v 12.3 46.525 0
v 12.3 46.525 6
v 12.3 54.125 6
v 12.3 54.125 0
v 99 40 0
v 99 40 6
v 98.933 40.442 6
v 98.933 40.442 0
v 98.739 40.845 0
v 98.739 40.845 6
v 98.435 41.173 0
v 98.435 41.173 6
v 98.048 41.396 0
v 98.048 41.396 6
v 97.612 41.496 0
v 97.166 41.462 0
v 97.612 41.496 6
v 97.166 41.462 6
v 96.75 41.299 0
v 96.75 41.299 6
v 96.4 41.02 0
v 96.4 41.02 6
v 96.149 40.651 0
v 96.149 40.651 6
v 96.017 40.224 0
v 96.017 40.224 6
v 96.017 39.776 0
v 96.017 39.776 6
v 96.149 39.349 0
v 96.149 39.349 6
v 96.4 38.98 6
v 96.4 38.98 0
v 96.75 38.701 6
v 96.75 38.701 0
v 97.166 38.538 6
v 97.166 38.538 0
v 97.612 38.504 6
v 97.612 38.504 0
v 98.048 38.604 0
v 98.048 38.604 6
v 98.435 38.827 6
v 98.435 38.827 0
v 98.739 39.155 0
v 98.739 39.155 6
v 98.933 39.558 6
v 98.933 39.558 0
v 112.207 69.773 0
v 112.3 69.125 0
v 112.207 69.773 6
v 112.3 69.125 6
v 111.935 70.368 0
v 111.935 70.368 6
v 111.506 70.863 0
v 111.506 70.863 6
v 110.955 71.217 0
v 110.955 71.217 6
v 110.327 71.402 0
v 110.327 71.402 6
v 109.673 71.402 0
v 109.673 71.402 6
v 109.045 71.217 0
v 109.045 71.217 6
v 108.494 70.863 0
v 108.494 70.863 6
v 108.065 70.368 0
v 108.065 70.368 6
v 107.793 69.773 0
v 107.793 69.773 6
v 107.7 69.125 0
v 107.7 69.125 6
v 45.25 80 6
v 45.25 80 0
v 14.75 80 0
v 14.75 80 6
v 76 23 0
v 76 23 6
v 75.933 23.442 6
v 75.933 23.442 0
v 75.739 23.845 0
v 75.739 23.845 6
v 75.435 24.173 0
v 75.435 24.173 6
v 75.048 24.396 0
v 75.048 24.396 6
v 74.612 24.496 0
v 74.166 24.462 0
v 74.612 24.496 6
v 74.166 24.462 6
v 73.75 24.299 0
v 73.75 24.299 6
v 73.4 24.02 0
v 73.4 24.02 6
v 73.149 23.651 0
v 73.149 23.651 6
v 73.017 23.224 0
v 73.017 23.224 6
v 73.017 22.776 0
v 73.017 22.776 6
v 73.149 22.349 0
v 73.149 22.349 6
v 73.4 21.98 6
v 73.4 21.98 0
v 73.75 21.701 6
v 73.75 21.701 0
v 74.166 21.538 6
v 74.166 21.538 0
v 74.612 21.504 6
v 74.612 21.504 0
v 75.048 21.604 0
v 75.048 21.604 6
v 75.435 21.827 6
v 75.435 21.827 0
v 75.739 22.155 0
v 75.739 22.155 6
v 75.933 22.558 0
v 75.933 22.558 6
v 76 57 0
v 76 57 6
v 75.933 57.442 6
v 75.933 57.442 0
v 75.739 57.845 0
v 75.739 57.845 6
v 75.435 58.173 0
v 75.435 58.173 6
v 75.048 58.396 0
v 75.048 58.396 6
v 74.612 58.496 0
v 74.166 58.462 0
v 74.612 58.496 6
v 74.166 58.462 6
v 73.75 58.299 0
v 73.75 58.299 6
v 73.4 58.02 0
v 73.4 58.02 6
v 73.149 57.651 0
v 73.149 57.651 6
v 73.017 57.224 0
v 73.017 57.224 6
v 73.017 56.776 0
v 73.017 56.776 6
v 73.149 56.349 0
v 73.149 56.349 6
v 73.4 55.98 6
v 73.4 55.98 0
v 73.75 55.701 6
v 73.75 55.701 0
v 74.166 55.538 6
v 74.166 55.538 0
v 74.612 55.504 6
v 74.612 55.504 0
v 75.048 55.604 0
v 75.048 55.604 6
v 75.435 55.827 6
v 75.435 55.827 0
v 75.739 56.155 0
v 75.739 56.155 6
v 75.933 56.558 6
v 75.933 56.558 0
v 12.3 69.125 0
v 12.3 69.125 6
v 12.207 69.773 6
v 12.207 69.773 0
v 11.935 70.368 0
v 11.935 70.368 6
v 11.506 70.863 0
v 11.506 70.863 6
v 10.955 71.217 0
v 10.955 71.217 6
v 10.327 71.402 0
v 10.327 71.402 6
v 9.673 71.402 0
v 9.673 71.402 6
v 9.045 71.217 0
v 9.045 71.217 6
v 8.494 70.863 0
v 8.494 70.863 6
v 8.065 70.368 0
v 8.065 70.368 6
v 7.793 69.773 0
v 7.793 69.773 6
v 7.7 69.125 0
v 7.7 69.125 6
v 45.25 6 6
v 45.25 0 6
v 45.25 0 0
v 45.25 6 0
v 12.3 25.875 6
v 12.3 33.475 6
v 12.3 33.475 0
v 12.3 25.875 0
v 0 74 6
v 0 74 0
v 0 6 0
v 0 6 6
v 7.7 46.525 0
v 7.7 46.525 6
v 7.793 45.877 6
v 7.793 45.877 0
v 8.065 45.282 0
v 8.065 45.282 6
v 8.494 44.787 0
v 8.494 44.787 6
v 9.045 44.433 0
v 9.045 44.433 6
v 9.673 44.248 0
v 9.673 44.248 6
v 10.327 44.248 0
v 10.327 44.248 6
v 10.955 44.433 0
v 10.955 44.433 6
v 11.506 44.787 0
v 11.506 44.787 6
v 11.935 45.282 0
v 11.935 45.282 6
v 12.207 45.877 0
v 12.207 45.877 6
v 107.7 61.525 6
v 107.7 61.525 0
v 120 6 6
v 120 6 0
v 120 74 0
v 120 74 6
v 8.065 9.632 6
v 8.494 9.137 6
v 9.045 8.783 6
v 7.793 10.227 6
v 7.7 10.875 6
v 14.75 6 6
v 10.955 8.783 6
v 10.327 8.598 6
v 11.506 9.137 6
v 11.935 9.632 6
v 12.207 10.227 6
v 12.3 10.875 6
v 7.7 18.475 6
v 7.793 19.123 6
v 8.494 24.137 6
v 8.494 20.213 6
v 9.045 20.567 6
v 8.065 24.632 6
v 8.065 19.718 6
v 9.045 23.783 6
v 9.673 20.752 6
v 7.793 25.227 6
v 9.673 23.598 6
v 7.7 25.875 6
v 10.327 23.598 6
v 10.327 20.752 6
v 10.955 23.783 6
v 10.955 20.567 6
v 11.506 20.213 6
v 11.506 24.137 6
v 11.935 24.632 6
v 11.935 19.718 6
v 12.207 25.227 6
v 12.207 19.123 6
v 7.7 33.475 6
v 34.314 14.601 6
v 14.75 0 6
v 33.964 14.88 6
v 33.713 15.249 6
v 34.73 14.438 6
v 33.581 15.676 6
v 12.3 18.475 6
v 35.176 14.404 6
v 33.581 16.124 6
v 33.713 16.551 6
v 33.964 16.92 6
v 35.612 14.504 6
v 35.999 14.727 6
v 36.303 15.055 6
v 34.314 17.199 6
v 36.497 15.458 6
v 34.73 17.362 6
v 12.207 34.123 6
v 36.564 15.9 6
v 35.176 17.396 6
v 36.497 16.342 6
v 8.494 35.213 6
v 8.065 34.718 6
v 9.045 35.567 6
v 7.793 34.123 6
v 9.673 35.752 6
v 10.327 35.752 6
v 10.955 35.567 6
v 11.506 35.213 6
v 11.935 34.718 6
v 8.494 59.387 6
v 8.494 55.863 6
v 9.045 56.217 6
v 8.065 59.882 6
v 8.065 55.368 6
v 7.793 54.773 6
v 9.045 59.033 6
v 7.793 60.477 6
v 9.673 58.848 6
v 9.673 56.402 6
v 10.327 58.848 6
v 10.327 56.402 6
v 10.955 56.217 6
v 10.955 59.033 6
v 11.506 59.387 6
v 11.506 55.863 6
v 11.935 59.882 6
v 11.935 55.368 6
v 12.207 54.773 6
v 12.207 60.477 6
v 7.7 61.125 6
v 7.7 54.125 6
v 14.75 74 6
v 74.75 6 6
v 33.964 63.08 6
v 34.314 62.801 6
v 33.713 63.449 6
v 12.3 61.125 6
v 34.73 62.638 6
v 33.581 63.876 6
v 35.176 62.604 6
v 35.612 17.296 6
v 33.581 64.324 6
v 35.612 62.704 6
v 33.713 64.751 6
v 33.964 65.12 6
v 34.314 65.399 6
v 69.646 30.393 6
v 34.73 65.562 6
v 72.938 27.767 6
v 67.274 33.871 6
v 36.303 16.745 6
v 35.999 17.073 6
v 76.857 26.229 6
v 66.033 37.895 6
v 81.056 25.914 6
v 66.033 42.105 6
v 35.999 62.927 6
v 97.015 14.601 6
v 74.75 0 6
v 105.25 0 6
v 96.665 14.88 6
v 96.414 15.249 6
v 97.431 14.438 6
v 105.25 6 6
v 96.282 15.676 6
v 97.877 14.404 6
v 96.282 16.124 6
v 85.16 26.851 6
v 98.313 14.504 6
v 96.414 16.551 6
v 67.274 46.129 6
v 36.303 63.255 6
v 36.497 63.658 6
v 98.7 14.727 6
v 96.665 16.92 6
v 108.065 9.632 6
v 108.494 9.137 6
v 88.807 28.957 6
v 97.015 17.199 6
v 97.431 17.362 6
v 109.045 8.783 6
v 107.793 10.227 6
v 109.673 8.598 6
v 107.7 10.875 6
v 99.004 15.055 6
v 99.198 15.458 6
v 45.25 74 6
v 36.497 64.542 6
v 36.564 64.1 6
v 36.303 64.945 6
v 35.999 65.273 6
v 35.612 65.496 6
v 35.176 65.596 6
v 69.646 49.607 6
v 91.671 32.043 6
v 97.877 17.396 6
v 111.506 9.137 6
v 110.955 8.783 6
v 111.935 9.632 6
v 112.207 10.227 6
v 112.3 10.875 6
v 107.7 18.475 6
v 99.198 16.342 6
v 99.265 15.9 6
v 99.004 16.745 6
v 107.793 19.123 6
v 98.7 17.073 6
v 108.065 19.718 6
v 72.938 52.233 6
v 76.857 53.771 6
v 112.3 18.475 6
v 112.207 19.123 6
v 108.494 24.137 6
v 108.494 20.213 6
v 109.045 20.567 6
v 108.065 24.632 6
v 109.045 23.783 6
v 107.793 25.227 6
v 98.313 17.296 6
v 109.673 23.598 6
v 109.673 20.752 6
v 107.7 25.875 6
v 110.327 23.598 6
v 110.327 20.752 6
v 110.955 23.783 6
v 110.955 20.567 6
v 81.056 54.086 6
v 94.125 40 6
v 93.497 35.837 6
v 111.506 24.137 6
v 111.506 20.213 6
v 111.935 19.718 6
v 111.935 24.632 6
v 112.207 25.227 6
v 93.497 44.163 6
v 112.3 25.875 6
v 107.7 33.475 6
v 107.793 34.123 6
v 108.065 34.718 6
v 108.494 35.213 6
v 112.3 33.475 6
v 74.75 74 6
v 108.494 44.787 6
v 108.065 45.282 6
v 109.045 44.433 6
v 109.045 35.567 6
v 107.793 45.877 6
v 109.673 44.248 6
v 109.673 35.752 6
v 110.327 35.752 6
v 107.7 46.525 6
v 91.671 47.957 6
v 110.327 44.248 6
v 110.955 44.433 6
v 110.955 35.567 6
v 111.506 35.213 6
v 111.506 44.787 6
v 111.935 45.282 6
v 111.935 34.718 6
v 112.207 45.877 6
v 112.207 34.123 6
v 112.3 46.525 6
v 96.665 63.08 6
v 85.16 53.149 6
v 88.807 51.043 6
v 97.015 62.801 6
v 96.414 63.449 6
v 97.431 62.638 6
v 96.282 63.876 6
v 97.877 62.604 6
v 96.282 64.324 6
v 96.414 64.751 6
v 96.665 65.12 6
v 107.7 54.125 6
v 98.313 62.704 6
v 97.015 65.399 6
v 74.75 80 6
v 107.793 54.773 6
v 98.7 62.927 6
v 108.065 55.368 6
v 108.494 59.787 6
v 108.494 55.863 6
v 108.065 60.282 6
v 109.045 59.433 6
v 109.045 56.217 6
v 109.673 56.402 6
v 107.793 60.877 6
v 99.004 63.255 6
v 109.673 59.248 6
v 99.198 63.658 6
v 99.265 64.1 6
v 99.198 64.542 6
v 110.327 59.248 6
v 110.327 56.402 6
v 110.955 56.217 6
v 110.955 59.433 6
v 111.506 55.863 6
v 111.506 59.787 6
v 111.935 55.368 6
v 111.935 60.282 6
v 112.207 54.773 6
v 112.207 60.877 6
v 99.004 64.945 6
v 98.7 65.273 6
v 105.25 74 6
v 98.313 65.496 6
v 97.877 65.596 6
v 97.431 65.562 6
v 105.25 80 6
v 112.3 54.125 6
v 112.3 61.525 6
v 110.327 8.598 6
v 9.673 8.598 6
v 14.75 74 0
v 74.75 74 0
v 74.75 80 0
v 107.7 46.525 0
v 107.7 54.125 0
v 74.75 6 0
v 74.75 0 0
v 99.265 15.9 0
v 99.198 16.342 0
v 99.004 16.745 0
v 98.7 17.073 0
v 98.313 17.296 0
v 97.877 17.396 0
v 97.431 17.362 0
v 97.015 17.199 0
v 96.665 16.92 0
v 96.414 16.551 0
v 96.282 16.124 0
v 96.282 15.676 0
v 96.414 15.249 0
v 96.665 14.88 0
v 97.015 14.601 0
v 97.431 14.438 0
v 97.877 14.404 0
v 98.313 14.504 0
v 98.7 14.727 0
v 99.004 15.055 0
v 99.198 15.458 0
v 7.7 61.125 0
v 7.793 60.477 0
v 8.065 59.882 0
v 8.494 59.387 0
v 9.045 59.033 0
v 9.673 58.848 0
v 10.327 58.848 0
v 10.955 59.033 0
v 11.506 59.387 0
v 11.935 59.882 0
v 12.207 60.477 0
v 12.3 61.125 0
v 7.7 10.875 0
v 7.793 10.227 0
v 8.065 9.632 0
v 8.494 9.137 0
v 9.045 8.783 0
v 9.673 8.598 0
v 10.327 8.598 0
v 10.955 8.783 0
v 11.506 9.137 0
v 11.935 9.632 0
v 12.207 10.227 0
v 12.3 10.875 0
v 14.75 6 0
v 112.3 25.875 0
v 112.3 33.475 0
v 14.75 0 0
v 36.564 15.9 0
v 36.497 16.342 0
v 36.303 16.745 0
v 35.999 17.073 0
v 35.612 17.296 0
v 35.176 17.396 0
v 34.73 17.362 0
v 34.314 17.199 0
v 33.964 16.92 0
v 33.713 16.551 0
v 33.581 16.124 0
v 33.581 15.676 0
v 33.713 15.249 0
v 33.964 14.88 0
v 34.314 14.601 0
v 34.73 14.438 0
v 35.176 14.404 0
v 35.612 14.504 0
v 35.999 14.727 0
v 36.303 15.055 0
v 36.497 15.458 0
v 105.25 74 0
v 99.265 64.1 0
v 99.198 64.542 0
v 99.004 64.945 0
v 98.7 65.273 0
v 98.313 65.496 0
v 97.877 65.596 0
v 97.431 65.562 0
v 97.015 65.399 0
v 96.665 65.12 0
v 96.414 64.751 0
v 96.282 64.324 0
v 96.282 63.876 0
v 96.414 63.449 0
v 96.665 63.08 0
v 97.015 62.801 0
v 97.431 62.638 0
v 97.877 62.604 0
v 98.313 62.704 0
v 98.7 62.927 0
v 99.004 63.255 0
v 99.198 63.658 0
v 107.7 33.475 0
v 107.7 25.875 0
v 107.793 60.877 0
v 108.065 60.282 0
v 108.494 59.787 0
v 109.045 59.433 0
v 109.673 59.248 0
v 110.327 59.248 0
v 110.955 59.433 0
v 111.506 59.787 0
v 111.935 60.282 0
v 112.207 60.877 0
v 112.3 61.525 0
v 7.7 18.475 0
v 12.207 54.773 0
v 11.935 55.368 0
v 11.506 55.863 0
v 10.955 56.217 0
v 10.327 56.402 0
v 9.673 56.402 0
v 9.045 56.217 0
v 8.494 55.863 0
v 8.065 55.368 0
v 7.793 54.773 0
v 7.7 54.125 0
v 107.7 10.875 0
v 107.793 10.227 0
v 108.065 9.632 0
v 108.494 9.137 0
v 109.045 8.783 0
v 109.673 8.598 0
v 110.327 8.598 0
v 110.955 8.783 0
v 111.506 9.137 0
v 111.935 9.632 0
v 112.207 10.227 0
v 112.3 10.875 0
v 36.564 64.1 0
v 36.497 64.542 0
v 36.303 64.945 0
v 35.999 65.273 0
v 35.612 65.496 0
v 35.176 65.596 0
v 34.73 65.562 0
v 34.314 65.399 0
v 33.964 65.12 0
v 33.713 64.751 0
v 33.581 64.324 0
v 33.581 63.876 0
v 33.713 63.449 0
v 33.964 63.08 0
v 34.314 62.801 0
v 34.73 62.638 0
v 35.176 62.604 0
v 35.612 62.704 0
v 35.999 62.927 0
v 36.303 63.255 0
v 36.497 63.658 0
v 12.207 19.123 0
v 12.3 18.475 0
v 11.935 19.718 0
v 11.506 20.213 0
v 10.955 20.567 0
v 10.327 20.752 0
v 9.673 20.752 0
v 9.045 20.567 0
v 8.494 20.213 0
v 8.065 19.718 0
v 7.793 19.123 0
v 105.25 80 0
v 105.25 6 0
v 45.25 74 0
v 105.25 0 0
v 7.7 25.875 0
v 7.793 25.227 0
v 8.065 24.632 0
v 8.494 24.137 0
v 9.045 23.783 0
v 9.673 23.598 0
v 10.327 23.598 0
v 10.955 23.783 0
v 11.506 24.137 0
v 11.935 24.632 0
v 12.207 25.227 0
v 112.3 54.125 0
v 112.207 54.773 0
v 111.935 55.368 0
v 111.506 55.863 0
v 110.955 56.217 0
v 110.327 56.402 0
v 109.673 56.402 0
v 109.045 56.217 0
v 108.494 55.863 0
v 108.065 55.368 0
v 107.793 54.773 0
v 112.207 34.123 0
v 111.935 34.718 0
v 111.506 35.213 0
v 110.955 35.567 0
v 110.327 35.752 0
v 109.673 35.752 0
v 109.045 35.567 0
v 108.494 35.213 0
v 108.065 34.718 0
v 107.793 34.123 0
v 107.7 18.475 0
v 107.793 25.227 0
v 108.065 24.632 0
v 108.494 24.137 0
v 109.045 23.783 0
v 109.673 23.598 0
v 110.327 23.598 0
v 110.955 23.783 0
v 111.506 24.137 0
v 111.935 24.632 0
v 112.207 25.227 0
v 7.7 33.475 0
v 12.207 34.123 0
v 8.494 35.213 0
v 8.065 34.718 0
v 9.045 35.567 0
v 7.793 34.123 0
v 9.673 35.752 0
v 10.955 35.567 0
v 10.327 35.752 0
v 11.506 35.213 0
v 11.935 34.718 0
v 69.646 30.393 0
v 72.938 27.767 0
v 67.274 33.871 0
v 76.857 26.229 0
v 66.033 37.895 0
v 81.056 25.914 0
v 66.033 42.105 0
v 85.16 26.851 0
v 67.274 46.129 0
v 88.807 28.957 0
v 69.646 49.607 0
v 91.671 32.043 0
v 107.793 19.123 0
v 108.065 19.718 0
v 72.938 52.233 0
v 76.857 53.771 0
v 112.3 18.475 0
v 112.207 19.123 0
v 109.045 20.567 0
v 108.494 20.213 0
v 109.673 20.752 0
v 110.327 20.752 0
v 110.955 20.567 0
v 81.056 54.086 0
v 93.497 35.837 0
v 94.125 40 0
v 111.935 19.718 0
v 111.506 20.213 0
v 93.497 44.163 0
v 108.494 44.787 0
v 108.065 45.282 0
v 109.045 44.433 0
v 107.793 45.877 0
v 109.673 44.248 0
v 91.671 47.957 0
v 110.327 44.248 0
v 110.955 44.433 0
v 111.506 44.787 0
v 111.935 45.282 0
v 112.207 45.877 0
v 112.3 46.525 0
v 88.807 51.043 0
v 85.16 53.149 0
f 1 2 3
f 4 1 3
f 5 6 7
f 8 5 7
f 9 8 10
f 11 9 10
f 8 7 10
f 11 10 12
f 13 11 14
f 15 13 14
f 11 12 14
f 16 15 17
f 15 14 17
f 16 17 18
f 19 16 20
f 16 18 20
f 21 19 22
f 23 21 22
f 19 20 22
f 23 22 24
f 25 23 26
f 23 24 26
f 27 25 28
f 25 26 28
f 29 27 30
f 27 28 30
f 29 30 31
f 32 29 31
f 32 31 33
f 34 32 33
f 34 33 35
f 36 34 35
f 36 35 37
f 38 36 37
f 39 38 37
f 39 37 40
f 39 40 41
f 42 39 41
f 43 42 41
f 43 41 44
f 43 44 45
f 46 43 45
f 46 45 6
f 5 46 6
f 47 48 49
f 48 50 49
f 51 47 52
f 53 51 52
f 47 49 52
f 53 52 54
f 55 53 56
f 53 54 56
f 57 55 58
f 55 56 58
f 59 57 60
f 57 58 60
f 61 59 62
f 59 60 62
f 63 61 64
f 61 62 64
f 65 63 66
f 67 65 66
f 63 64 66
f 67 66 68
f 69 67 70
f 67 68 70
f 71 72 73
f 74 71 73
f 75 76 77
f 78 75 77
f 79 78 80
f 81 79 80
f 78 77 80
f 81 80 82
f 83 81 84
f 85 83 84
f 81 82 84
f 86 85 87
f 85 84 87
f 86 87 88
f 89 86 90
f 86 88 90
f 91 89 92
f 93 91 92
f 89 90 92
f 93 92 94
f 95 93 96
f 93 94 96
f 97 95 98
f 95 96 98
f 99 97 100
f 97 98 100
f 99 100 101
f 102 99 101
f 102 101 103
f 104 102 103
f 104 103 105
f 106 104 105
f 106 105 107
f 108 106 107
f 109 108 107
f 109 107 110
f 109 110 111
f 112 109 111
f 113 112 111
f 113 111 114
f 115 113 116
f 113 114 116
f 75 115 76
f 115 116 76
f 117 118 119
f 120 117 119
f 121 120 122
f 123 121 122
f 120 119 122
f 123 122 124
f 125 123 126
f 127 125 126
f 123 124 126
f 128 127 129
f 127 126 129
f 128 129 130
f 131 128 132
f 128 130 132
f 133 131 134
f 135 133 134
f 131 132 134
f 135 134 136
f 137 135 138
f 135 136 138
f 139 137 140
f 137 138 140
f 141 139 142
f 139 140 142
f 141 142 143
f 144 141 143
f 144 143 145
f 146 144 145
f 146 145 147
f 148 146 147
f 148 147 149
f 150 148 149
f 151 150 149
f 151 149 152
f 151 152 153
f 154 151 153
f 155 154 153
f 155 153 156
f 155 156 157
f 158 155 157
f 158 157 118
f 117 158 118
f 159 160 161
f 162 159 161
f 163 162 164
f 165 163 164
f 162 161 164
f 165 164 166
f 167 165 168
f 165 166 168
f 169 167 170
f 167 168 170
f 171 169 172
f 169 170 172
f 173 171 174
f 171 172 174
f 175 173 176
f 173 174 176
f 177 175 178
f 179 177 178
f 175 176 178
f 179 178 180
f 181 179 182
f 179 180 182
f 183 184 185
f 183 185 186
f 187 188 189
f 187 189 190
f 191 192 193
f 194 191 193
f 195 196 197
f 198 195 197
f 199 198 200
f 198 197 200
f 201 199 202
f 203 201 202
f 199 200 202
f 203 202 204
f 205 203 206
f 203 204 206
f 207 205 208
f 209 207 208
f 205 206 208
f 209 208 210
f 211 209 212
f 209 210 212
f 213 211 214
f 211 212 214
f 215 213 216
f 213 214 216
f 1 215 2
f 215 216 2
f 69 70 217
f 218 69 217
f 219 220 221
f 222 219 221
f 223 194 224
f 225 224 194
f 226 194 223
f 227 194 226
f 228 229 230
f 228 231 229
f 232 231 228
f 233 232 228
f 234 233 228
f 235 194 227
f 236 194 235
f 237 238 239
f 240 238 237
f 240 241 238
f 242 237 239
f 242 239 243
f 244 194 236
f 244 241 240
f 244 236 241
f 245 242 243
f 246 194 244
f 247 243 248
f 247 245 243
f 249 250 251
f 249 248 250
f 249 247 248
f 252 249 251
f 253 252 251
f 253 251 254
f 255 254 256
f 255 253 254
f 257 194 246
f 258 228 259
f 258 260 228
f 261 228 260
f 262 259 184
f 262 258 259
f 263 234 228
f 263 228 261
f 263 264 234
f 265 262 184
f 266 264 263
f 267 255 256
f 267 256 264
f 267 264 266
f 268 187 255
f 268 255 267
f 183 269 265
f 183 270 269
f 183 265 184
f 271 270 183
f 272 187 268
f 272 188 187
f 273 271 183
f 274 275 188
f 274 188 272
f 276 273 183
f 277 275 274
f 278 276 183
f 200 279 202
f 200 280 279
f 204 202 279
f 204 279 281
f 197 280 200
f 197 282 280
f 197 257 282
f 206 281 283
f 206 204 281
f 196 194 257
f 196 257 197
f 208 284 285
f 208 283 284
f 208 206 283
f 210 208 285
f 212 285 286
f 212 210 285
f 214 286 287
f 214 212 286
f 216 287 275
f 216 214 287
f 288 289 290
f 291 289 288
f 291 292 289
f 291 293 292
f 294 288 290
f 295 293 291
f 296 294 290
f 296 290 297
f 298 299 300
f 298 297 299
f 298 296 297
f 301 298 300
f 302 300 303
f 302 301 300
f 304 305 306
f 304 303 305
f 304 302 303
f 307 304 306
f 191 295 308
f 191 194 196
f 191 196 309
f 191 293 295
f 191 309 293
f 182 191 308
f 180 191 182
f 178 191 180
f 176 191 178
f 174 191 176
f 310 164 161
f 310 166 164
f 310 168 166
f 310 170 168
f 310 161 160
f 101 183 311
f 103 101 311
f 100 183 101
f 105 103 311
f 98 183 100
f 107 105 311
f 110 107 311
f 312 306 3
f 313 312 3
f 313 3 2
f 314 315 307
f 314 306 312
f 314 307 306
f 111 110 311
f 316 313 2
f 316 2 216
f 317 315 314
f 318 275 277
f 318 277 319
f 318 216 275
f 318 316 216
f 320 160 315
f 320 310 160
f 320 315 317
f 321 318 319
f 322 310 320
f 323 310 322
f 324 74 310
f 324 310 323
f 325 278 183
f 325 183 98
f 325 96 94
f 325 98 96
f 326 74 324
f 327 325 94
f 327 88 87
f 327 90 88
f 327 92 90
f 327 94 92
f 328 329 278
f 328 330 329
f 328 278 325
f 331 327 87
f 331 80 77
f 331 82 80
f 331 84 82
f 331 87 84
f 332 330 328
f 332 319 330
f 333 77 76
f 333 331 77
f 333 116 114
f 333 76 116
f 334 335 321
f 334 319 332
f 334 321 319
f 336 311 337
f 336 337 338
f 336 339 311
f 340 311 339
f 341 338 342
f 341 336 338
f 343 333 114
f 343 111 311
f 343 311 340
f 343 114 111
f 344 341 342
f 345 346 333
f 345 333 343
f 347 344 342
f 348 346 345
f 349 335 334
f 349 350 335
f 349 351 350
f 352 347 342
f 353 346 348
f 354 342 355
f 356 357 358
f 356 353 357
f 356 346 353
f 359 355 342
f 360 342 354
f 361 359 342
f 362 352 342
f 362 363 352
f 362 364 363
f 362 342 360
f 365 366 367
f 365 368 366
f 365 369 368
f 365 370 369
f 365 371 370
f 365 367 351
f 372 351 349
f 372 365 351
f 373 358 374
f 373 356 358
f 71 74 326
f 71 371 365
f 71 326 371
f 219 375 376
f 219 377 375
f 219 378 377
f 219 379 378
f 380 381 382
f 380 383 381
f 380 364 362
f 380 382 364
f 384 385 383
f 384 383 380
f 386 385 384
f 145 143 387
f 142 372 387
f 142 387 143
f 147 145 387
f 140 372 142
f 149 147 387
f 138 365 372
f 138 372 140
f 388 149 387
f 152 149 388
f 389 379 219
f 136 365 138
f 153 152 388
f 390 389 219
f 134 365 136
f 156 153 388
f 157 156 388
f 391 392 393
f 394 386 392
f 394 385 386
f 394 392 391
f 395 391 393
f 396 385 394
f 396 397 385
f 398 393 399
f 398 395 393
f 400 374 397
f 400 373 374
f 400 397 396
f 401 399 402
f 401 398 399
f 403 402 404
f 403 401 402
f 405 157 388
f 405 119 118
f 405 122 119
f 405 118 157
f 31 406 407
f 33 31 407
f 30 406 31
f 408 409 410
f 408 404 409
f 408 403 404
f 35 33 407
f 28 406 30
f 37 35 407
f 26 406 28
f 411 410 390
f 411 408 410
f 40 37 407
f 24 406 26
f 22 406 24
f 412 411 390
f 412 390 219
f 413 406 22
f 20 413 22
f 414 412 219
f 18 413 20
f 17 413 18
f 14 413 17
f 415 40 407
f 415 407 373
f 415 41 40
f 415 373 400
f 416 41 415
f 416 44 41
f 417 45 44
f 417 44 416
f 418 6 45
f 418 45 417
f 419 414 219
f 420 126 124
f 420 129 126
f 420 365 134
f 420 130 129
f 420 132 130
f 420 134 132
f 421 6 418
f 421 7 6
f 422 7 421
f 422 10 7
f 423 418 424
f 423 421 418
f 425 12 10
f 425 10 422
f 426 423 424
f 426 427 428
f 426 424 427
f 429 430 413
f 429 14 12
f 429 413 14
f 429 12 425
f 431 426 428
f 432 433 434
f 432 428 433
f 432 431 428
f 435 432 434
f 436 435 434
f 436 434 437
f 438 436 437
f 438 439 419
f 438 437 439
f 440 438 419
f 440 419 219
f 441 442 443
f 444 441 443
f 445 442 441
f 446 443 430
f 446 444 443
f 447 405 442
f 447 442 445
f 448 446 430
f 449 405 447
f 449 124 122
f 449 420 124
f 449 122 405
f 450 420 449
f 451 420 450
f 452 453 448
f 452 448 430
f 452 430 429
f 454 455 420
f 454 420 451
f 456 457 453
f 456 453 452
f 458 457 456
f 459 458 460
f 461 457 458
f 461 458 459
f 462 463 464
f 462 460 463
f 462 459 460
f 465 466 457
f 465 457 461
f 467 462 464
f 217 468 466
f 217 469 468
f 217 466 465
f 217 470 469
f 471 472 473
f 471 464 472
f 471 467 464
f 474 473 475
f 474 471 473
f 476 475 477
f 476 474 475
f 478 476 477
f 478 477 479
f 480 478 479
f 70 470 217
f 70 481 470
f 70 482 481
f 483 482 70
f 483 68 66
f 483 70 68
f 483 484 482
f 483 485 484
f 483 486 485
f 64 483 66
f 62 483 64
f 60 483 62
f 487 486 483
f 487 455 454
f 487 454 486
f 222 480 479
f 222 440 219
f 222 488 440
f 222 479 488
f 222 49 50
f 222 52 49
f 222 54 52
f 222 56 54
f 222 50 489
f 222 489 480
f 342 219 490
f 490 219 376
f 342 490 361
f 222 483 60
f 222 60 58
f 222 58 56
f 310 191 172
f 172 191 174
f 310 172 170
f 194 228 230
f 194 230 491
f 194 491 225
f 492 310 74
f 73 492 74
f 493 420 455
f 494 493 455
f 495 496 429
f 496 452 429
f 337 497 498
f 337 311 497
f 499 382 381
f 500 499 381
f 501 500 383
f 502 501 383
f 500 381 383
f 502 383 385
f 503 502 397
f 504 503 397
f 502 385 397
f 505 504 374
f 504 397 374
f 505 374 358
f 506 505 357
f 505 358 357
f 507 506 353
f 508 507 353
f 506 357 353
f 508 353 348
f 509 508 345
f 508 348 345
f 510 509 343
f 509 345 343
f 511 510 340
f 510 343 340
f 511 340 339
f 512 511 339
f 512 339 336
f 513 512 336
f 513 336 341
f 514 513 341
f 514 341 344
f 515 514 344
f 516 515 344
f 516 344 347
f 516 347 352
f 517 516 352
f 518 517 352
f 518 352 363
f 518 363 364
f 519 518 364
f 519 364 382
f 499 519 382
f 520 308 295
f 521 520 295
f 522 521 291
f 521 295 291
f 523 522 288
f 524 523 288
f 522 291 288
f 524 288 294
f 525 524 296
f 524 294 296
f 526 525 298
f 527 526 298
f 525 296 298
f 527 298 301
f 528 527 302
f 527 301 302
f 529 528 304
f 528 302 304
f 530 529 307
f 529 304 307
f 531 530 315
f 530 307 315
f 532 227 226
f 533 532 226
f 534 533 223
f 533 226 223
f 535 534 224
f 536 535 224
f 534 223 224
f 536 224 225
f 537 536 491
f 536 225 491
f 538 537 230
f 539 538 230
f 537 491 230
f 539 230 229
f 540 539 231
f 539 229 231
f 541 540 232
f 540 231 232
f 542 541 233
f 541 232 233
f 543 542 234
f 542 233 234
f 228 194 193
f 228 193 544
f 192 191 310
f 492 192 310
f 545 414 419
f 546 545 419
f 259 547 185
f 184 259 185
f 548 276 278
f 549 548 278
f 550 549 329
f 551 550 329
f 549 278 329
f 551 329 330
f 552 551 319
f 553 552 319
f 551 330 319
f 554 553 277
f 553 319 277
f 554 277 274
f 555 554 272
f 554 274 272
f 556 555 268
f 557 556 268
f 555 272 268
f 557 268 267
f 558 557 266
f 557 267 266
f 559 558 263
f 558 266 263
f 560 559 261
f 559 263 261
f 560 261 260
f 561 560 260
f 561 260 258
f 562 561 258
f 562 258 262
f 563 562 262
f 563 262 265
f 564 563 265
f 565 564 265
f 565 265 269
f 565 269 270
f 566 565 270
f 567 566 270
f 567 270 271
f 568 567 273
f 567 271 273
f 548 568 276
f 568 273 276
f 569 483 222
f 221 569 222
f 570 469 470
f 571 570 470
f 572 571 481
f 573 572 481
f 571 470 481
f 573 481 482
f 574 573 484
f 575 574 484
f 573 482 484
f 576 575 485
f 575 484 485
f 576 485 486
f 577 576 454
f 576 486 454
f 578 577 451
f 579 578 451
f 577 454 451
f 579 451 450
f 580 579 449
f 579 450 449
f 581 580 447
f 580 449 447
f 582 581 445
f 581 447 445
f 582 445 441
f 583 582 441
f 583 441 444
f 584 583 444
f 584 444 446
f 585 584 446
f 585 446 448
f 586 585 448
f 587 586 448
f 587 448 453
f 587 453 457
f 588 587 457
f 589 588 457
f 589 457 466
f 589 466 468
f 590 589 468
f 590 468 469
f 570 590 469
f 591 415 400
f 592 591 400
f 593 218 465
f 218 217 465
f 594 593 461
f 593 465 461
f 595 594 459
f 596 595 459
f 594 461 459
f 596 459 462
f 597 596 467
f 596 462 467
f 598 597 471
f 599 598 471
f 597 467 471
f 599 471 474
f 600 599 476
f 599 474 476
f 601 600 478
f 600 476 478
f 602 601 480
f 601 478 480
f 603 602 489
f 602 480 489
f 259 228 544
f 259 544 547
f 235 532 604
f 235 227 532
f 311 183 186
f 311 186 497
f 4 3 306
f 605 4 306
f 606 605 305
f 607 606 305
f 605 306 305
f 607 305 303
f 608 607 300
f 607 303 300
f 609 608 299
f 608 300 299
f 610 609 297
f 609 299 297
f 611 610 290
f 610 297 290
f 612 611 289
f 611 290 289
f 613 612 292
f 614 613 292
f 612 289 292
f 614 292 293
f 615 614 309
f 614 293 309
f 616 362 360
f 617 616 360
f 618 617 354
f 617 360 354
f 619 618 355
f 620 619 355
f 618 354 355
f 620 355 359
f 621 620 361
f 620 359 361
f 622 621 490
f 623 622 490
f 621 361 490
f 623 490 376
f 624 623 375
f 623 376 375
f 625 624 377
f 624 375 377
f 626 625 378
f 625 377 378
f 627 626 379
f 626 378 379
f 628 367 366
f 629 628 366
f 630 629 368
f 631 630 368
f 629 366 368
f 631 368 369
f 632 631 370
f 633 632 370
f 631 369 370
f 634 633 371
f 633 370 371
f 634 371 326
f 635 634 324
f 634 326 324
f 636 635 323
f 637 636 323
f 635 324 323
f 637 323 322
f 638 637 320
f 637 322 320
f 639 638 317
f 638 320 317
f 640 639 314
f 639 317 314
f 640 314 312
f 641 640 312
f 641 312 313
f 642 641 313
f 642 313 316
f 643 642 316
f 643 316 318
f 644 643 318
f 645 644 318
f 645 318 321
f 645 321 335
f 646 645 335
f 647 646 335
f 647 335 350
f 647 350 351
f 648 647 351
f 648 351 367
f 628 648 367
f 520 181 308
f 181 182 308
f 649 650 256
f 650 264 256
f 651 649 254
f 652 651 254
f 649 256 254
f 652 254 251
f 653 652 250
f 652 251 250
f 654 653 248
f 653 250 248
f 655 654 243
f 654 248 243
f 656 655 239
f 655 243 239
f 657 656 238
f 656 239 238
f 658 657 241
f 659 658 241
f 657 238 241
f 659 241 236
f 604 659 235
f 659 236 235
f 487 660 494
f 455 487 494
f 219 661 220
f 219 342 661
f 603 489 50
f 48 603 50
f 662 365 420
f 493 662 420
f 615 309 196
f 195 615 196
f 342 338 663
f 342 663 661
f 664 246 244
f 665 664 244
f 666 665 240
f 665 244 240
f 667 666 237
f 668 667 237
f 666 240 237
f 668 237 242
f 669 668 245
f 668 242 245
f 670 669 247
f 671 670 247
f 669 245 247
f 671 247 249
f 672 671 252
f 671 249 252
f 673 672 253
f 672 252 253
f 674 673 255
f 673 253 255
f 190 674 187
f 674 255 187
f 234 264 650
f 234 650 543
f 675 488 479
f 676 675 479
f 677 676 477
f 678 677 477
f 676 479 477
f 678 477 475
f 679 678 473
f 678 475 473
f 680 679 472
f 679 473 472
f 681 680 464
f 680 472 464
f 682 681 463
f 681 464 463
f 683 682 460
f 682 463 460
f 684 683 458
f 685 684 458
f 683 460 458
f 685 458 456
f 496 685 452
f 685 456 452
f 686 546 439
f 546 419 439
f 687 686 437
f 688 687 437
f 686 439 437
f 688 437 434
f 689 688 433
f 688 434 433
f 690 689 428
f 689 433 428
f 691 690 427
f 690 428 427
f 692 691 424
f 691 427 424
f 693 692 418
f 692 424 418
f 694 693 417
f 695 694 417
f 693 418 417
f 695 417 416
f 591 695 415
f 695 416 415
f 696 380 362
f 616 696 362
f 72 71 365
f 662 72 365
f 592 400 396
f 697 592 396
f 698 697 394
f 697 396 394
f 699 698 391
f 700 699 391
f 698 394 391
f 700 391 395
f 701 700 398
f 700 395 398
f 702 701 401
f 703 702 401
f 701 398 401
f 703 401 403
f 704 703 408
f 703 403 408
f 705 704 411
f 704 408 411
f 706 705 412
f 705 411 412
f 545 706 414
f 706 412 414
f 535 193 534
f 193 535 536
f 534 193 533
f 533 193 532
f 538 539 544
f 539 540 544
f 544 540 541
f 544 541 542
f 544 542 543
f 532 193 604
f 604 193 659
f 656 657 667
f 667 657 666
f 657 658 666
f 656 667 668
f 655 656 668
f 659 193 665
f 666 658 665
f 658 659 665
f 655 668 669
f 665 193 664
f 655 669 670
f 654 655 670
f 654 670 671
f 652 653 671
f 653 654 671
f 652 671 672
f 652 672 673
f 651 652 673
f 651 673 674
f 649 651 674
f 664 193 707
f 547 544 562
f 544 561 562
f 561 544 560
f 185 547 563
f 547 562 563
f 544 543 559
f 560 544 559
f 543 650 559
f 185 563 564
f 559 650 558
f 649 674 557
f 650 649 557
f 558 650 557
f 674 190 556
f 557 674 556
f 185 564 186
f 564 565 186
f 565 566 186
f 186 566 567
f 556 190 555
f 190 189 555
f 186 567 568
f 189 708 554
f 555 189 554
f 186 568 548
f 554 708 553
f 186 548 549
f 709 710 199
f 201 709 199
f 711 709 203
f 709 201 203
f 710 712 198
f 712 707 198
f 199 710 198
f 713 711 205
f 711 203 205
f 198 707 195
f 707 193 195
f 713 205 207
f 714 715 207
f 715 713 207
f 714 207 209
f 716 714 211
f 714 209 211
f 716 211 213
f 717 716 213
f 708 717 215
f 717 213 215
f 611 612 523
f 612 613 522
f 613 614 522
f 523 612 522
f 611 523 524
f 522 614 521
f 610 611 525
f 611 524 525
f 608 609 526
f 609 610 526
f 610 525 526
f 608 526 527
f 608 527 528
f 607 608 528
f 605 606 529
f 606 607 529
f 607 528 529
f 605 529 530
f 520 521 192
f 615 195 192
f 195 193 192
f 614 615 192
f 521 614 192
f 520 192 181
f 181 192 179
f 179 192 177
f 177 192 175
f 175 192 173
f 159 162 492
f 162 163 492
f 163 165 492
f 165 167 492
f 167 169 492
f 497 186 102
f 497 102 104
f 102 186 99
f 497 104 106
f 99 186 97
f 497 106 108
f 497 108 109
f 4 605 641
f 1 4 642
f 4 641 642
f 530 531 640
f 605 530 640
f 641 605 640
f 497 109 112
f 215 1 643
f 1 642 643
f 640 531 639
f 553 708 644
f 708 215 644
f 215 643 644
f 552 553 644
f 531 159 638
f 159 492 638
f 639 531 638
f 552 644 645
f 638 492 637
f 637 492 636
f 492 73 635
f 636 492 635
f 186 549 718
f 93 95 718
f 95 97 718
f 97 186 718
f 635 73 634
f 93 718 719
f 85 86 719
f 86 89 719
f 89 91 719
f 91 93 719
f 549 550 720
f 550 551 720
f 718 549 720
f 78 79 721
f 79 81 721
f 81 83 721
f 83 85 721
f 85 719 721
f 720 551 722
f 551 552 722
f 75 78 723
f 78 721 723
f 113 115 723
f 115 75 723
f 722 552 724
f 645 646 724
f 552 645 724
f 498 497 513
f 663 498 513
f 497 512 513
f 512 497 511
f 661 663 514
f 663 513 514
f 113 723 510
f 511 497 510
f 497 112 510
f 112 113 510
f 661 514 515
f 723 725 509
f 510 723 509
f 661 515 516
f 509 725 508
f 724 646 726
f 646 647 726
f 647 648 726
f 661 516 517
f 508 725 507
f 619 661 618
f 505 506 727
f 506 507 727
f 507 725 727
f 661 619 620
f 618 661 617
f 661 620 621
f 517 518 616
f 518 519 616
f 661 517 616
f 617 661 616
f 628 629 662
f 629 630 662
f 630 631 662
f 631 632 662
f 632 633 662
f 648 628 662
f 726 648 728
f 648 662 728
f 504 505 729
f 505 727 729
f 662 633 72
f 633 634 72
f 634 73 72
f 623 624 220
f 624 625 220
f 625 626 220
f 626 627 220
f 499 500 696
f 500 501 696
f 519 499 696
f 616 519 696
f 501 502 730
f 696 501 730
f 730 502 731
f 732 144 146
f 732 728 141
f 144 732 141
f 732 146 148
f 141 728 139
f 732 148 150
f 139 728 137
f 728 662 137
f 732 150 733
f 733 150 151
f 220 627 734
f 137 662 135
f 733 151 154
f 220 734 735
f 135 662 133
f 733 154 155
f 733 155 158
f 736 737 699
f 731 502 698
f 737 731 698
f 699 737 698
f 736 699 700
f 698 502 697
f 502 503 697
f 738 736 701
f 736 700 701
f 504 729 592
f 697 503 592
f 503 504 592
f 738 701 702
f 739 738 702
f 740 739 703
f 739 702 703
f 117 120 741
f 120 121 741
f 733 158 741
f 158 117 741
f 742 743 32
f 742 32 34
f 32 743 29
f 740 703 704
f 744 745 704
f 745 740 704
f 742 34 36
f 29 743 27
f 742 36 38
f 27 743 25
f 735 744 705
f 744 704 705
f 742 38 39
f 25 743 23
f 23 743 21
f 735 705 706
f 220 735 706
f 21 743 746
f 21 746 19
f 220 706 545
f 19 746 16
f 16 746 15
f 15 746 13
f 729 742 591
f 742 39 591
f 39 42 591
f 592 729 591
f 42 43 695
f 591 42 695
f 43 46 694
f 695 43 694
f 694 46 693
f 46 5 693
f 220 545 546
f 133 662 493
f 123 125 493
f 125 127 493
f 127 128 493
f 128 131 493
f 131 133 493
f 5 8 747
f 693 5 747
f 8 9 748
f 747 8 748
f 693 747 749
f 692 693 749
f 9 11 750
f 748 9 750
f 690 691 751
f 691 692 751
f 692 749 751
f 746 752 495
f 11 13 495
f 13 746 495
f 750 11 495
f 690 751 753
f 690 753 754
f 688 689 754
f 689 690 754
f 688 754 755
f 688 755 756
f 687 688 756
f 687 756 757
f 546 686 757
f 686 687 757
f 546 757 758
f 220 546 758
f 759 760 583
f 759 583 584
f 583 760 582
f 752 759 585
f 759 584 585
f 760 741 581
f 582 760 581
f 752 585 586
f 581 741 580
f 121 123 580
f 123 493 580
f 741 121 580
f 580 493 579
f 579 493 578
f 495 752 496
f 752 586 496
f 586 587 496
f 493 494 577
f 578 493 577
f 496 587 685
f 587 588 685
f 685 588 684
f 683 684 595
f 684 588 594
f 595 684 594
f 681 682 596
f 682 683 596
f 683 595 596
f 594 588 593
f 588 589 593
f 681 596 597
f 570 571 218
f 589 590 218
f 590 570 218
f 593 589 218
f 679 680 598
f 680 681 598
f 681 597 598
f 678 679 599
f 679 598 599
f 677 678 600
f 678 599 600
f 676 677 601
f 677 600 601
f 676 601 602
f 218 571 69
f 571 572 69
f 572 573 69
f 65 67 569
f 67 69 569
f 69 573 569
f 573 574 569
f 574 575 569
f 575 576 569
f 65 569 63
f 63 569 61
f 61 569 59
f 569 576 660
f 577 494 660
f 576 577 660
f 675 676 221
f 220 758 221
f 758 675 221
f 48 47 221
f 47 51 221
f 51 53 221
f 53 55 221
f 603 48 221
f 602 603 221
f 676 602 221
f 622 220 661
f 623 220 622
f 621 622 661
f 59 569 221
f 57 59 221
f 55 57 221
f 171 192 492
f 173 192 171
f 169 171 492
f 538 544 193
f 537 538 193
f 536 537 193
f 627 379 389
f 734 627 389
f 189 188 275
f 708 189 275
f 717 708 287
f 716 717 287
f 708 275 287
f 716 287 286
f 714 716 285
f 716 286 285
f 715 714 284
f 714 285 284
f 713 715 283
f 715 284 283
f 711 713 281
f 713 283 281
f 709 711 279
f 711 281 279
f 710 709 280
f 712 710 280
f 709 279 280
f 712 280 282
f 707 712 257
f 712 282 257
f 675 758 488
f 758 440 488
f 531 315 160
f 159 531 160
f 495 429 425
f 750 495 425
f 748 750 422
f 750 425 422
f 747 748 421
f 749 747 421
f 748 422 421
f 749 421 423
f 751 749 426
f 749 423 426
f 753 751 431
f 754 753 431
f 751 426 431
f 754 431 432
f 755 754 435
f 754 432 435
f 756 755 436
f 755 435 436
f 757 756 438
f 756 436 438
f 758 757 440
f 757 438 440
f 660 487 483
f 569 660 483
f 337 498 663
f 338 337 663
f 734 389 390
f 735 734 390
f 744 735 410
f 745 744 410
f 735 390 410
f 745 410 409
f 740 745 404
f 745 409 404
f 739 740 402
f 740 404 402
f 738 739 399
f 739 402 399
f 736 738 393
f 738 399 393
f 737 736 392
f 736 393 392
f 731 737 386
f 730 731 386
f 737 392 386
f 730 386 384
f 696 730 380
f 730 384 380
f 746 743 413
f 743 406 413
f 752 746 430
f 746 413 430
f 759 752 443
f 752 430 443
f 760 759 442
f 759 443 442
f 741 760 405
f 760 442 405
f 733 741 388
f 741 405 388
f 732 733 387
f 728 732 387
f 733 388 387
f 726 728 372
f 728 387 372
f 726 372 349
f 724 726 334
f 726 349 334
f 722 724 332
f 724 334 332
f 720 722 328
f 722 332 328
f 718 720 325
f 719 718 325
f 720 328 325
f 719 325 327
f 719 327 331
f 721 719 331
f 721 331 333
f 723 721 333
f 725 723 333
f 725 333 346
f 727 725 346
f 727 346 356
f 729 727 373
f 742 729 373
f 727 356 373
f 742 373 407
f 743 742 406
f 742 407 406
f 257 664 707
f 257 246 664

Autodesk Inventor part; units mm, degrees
ref_plane "YZ Plane" through (0, 0, 0) normal (1, 0, 0) x (0, 1, 0)
ref_plane "XZ Plane" through (0, 0, 0) normal (0, 1, 0) x (-1, 0, 0)
ref_plane "XY Plane" through (0, 0, 0) normal (0, 0, 1) x (1, 0, 0)
sketch "Sketch1" plane through (0, 0, 0) normal (0, 0, 1) x (1, 0, 0)
  line L0 (0, 0) -> (120, 0)
  line L1 (120, 0) -> (120, 80)
  line L2 (120, 80) -> (0, 80)
  line L3 (0, 80) -> (0, 0)
  dimension "d0" = 120
  dimension "d1" = 80
extrude "Extrusion1" add sketch "Sketch1" along normal blind 6
sketch "Sketch2" plane through (0, 0, 6) normal (0, 0, 1) x (1, 0, 0)
  line L0 (0, 0) -> (120, 0) projected
  line L1 (120, 0) -> (120, 80) projected
  line L2 (120, 80) -> (0, 80) projected
  line L3 (0, 80) -> (0, 0) projected
  line L4 (120, 0) -> (105.25, 0)
  line L5 (105.25, 0) -> (105.25, 6)
  line L6 (105.25, 6) -> (120, 6)
  line L7 (120, 6) -> (120, 0)
  line L8 (0, 0) -> (120, 0) projected
  line L9 (74.75, 0) -> (45.25, 0)
  line L10 (45.25, 0) -> (45.25, 6)
  line L11 (45.25, 6) -> (74.75, 6)
  line L12 (74.75, 6) -> (74.75, 0)
  line L13 (14.75, 0) -> (0, 0)
  line L14 (0, 0) -> (0, 6)
  line L15 (0, 6) -> (14.75, 6)
  line L16 (14.75, 6) -> (14.75, 0)
  line L17 (120, 80) -> (105.25, 80)
  line L18 (105.25, 80) -> (105.25, 74)
  line L19 (105.25, 74) -> (120, 74)
  line L20 (120, 74) -> (120, 80)
  line L21 (120, 80) -> (0, 80) projected
  line L22 (74.75, 80) -> (45.25, 80)
  line L23 (45.25, 80) -> (45.25, 74)
  line L24 (45.25, 74) -> (74.75, 74)
  line L25 (74.75, 74) -> (74.75, 80)
  line L26 (14.75, 80) -> (0, 80)
  line L27 (0, 80) -> (0, 74)
  line L28 (0, 74) -> (14.75, 74)
  line L29 (14.75, 74) -> (14.75, 80)
  line L30 (60, -24.5918) -> (60, 107.6161)
  line L31 (0, 80) -> (0, 0) projected
  dimension "d4" = 6
  dimension "d5" = 6
  dimension "d6" = 14.75
  dimension "d7" = 14.75
  dimension "d8" = 29.5
  dimension "d18" = 60
  dimension "d19" = 14.75
extrude "Extrusion2" cut sketch "Sketch2" against normal up to next contours L3 L15 L16 L0 | L10 L11 L30 L0 | L3 L2 L29 L28 | L30 L11 L12 L0 | L5 L6 L1 L0 | L30 L2 L25 L24 | L24 L23 L2 L30 | L19 L18 L2 L1
sketch "Sketch3" plane through (0, 0, 6) normal (0, 0, 1) x (1, 0, 0)
  circle A0 centre (80, 40) radius 4.6
  line L0 (74.75, 0) -> (105.25, 0) projected
  line L1 (120, 6) -> (120, 74) projected
  point P0 (0, 0)
  dimension "d13" = 9.2
  dimension "d14" = 40
  dimension "d15" = 40
extrude "Extrusion3" cut sketch "Sketch3" against normal up to next
sketch "Sketch4" plane through (0, 0, 6) normal (0, 0, 1) x (1, 0, 0)
  circle A0 centre (80, 40) radius 4.6 projected
  line L0 (74.75, 6) -> (74.75, 0) projected
  line L1 (74.75, 0) -> (105.25, 0) projected
  line L2 (105.25, 0) -> (105.25, 6) projected
  line L3 (105.25, 6) -> (120, 6) projected
  line L4 (120, 6) -> (120, 74) projected
  line L5 (120, 74) -> (105.25, 74) projected
  line L6 (105.25, 74) -> (105.25, 80) projected
  line L7 (105.25, 80) -> (74.75, 80) projected
  line L8 (74.75, 80) -> (74.75, 74) projected
  line L9 (74.75, 74) -> (45.25, 74) projected
  line L10 (45.25, 74) -> (45.25, 80) projected
  line L11 (45.25, 80) -> (14.75, 80) projected
  line L12 (14.75, 80) -> (14.75, 74) projected
  line L13 (14.75, 74) -> (0, 74) projected
  line L14 (0, 74) -> (0, 6) projected
  line L15 (0, 6) -> (14.75, 6) projected
  line L16 (14.75, 6) -> (14.75, 0) projected
  line L17 (14.75, 0) -> (45.25, 0) projected
  line L18 (45.25, 0) -> (45.25, 6) projected
  line L19 (45.25, 6) -> (74.75, 6) projected
  circle A1 centre (80, 40) radius 14.125
  circle A2 centre (97.5, 40) radius 1.5
  circle A3 centre (74.5, 57) radius 1.5
  circle A4 centre (74.5, 23) radius 1.5
  circle A5 centre (35.064, 64.1) radius 1.5
  circle A6 centre (35.064, 15.9) radius 1.5
  line L20 (80, 40) -> (97.5, 40) construction
  circle A7 centre (10, 66.125) radius 2.3
  circle A8 centre (10, 51.125) radius 2.3
  circle A9 centre (10, 13.875) radius 2.3
  circle A10 centre (10, 28.875) radius 2.3
  circle A11 centre (110, 66.125) radius 2.3
  circle A12 centre (110, 51.125) radius 2.3
  circle A13 centre (110, 13.875) radius 2.3
  circle A14 centre (110, 28.875) radius 2.3
  line L21 (10, 66.125) -> (110, 66.125) construction
  line L22 (110, 66.125) -> (110, 13.875) construction
  line L23 (110, 13.875) -> (10, 13.875) construction
  line L24 (10, 13.875) -> (10, 66.125) construction
  circle A15 centre (10, 61.125) radius 2.3
  circle A16 centre (10, 54.125) radius 2.3
  circle A17 centre (10, 69.125) radius 2.3
  circle A18 centre (10, 46.525) radius 2.3
  circle A19 centre (10, 33.475) radius 2.3
  circle A20 centre (10, 25.875) radius 2.3
  circle A21 centre (10, 18.475) radius 2.3
  circle A22 centre (10, 10.875) radius 2.3
  circle A23 centre (110, 69.125) radius 2.3
  circle A24 centre (110, 61.525) radius 2.3
  circle A25 centre (110, 54.125) radius 2.3
  circle A26 centre (110, 46.525) radius 2.3
  circle A27 centre (110, 33.475) radius 2.3
  circle A28 centre (110, 25.875) radius 2.3
  circle A29 centre (110, 18.475) radius 2.3
  circle A30 centre (110, 10.875) radius 2.3
  line L25 (7.7, 69.125) -> (7.7, 61.125)
  line L26 (12.3, 61.125) -> (12.3, 69.125)
  line L27 (7.7, 54.125) -> (7.7, 46.525)
  line L28 (12.3, 46.525) -> (12.3, 54.125)
  line L29 (7.7, 10.875) -> (7.7, 18.475)
  line L30 (7.7, 25.875) -> (7.7, 33.475)
  line L31 (12.3, 33.475) -> (12.3, 25.875)
  line L32 (12.3, 18.475) -> (12.3, 10.875)
  line L33 (112.3, 61.525) -> (112.3, 69.125)
  line L34 (107.7, 69.125) -> (107.7, 61.525)
  line L35 (107.7, 54.125) -> (107.7, 46.525)
  line L36 (112.3, 46.525) -> (112.3, 54.125)
  line L37 (107.7, 33.475) -> (107.7, 25.875)
  line L38 (107.7, 18.475) -> (107.7, 10.875)
  line L39 (112.3, 10.875) -> (112.3, 18.475)
  line L40 (112.3, 25.875) -> (112.3, 33.475)
  point P0 (0, 0)
  dimension "d20" = 28.25
  dimension "d21" = 3
  dimension "d22" = 3
  dimension "d23" = 3
  dimension "d24" = 3
  dimension "d25" = 3
  dimension "d26" = 17.5
  dimension "d27" = 5.5
  dimension "d28" = 5.5
  dimension "d29" = 34
  dimension "d30" = 17
  dimension "d31" = 48.2
  dimension "d32" = 24.1
  dimension "d33" = 44.936
  dimension "d34" = 44.936
  dimension "d37" = 10
  dimension "d38" = 10
  dimension "d39" = 4.6
  dimension "d40" = 4.6
  dimension "d41" = 4.6
  dimension "d42" = 4.6
  dimension "d43" = 4.6
  dimension "d44" = 4.6
  dimension "d45" = 4.6
  dimension "d46" = 4.6
  dimension "d47" = 13.875
  dimension "d48" = 13.875
  dimension "d49" = 15
  dimension "d50" = 15
  dimension "d51" = 15
  dimension "d52" = 15
  dimension "d53" = 4.6
  dimension "d54" = 4.6
  dimension "d56" = 3
  dimension "d57" = 5
  dimension "d58" = 4.6
  dimension "d59" = 3
  dimension "d60" = 4.6
  dimension "d61" = 4.6
  dimension "d62" = 4.6
  dimension "d63" = 4.6
  dimension "d64" = 4.6
  dimension "d65" = 3
  dimension "d66" = 3
  dimension "d67" = 4.6
  dimension "d68" = 4.6
  dimension "d69" = 4.6
  dimension "d70" = 4.6
  dimension "d71" = 4.6
  dimension "d72" = 4.6
  dimension "d73" = 4.6
  dimension "d74" = 4.6
  dimension "d75" = 3
  dimension "d76" = 3
  dimension "d77" = 3
  dimension "d78" = 3
extrude "Extrusion4" cut sketch "Sketch4" against normal blind 10 contours A1 | A2 | A3 | A4 | A5 | A6
extrude "Extrusion5" cut sketch "Sketch4" against normal blind 10 contours A7 A17 | L26 A15 L25 A7 | A7 A17 L26 | A17 A7 | A7 A17 | L25 A17 A7 | A15 | A8 A16 | L28 A18 A8 | A8 A16 L28 | A16 A8 | A8 A16 | A18 L27 A8 | A18 | A8 L27 A16 | A9 A22 | L32 A22 A9 | A9 A21 L32 | A9 L29 A21 | A21 | A22 A9 | A9 A22 | A9 A22 L29 | A10 A20 | L31 A20 A10 | A10 A19 L31 | A10 L30 A19 | A19 | A20 A10 | A10 A20 | A10 A20 L30 | A11 A23 | L33 A24 A11 | A11 A23 L33 | A23 A11 | A11 A23 | A24 L34 A11 | A24 | A11 L34 A23 | A12 A25 | L36 A26 A12 | A12 A25 L36 | A25 A12 | A12 A25 | A26 L35 A12 | A26 | A12 L35 A25 | A13 A30 | L39 A30 A13 | A13 A29 L39 | A13 L38 A29 | A29 | A30 A13 | A13 A30 | A13 A30 L38 | A14 A28 | L40 A28 A14 | A14 A27 L40 | A14 L37 A27 | A27 | A28 A14 | A14 A28 | A14 A28 L37
sketch "Sketch6" plane through (0, 0, 6) normal (0, 0, 1) x (1, 0, 0)
  line L0 (107.7, 25.875) -> (107.7, 33.475) projected
  arc A0 (112.3, 33.475) -> (107.7, 33.475) centre (110, 33.475) ccw projected
  line L1 (112.3, 33.475) -> (112.3, 25.875) projected
  arc A1 (107.7, 25.875) -> (112.3, 25.875) centre (110, 25.875) ccw projected
  line L2 (7.7, 25.875) -> (7.7, 33.475) projected
  arc A2 (12.3, 33.475) -> (7.7, 33.475) centre (10, 33.475) ccw projected
  line L3 (12.3, 33.475) -> (12.3, 25.875) projected
  arc A3 (7.7, 25.875) -> (12.3, 25.875) centre (10, 25.875) ccw projected
  line L4 (12.3, 54.125) -> (12.3, 46.525) projected
  arc A4 (7.7, 46.525) -> (12.3, 46.525) centre (10, 46.525) ccw projected
  line L5 (7.7, 46.525) -> (7.7, 54.125) projected
  arc A5 (12.3, 54.125) -> (7.7, 54.125) centre (10, 54.125) ccw projected
  line L6 (7.7, 10.875) -> (7.7, 18.475) projected
  arc A6 (12.3, 18.475) -> (7.7, 18.475) centre (10, 18.475) ccw projected
  line L7 (12.3, 18.475) -> (12.3, 10.875) projected
  arc A7 (7.7, 10.875) -> (12.3, 10.875) centre (10, 10.875) ccw projected
  line L8 (107.7, 61.525) -> (107.7, 69.125) projected
  arc A8 (112.3, 69.125) -> (107.7, 69.125) centre (110, 69.125) ccw projected
  line L9 (112.3, 69.125) -> (112.3, 61.525) projected
  arc A9 (107.7, 61.525) -> (112.3, 61.525) centre (110, 61.525) ccw projected
  line L10 (112.3, 18.475) -> (112.3, 10.875) projected
  arc A10 (107.7, 10.875) -> (112.3, 10.875) centre (110, 10.875) ccw projected
  line L11 (107.7, 10.875) -> (107.7, 18.475) projected
  arc A11 (112.3, 18.475) -> (107.7, 18.475) centre (110, 18.475) ccw projected
  line L12 (7.7, 61.125) -> (7.7, 69.125) projected
  arc A12 (12.3, 69.125) -> (7.7, 69.125) centre (10, 69.125) ccw projected
  line L13 (12.3, 69.125) -> (12.3, 61.125) projected
  arc A13 (7.7, 61.125) -> (12.3, 61.125) centre (10, 61.125) ccw projected
  line L14 (112.3, 54.125) -> (112.3, 46.525) projected
  arc A14 (107.7, 46.525) -> (112.3, 46.525) centre (110, 46.525) ccw projected
  line L15 (107.7, 46.525) -> (107.7, 54.125) projected
  arc A15 (112.3, 54.125) -> (107.7, 54.125) centre (110, 54.125) ccw projected
  circle A16 centre (80, 40) radius 14.125 projected
  circle A17 centre (35.064, 64.1) radius 1.5 projected
  circle A18 centre (74.5, 57) radius 1.5 projected
  circle A19 centre (97.5, 40) radius 1.5 projected
  circle A20 centre (74.5, 23) radius 1.5 projected
  circle A21 centre (35.064, 15.9) radius 1.5 projected
  line L16 (74.75, 6) -> (74.75, 0) projected
  line L17 (74.75, 0) -> (105.25, 0) projected
  line L18 (105.25, 0) -> (105.25, 6) projected
  line L19 (105.25, 6) -> (120, 6) projected
  line L20 (120, 6) -> (120, 74) projected
  line L21 (120, 74) -> (105.25, 74) projected
  line L22 (105.25, 74) -> (105.25, 80) projected
  line L23 (105.25, 80) -> (74.75, 80) projected
  line L24 (74.75, 80) -> (74.75, 74) projected
  line L25 (74.75, 74) -> (45.25, 74) projected
  line L26 (45.25, 74) -> (45.25, 80) projected
  line L27 (45.25, 80) -> (14.75, 80) projected
  line L28 (14.75, 80) -> (14.75, 74) projected
  line L29 (14.75, 74) -> (0, 74) projected
  line L30 (0, 74) -> (0, 6) projected
  line L31 (0, 6) -> (14.75, 6) projected
  line L32 (14.75, 6) -> (14.75, 0) projected
  line L33 (14.75, 0) -> (45.25, 0) projected
  line L34 (45.25, 0) -> (45.25, 6) projected
  line L35 (45.25, 6) -> (74.75, 6) projected
  circle A22 centre (97.765, 15.9) radius 1.5
  circle A23 centre (97.765, 64.1) radius 1.5
  point P0 (0, 0)
  dimension "d94" = 62.701
  dimension "d95" = 15.9
  dimension "d96" = 15.9
  dimension "d97" = 3
  dimension "d98" = 62.701
  dimension "d99" = 15.9
  dimension "d100" = 3
extrude "Extrusion7" cut sketch "Sketch6" against normal blind 10 contours A22 | A23
equation "\"d22\" = d21"
equation "\"d23\" = d21"
equation "\"d24\" = d21"
equation "\"d25\" = d21"
equation "\"d30\" = 0.5 * d29"
equation "\"d32\" = 0.5 * d31"
equation "\"d34\" = d33"
equation "\"d39\" = d64"
equation "\"d40\" = d64"
equation "\"d41\" = d64"
equation "\"d42\" = d64"
equation "\"d43\" = d74"
equation "\"d44\" = d74"
equation "\"d45\" = d74"
equation "\"d46\" = d74"
equation "\"d48\" = d47"
equation "\"d53\" = d64"
equation "\"d54\" = d64"
equation "\"d58\" = d64"
equation "\"d60\" = d64"
equation "\"d61\" = d64"
equation "\"d62\" = d64"
equation "\"d63\" = d64"
equation "\"d67\" = d74"
equation "\"d68\" = d74"
equation "\"d69\" = d74"
equation "\"d70\" = d74"
equation "\"d71\" = d74"
equation "\"d72\" = d74"
equation "\"d73\" = d74"
equation "\"d96\" = d95"
equation "\"d98\" = d94"
equation "\"d99\" = d96"
properties part number "bottom"
